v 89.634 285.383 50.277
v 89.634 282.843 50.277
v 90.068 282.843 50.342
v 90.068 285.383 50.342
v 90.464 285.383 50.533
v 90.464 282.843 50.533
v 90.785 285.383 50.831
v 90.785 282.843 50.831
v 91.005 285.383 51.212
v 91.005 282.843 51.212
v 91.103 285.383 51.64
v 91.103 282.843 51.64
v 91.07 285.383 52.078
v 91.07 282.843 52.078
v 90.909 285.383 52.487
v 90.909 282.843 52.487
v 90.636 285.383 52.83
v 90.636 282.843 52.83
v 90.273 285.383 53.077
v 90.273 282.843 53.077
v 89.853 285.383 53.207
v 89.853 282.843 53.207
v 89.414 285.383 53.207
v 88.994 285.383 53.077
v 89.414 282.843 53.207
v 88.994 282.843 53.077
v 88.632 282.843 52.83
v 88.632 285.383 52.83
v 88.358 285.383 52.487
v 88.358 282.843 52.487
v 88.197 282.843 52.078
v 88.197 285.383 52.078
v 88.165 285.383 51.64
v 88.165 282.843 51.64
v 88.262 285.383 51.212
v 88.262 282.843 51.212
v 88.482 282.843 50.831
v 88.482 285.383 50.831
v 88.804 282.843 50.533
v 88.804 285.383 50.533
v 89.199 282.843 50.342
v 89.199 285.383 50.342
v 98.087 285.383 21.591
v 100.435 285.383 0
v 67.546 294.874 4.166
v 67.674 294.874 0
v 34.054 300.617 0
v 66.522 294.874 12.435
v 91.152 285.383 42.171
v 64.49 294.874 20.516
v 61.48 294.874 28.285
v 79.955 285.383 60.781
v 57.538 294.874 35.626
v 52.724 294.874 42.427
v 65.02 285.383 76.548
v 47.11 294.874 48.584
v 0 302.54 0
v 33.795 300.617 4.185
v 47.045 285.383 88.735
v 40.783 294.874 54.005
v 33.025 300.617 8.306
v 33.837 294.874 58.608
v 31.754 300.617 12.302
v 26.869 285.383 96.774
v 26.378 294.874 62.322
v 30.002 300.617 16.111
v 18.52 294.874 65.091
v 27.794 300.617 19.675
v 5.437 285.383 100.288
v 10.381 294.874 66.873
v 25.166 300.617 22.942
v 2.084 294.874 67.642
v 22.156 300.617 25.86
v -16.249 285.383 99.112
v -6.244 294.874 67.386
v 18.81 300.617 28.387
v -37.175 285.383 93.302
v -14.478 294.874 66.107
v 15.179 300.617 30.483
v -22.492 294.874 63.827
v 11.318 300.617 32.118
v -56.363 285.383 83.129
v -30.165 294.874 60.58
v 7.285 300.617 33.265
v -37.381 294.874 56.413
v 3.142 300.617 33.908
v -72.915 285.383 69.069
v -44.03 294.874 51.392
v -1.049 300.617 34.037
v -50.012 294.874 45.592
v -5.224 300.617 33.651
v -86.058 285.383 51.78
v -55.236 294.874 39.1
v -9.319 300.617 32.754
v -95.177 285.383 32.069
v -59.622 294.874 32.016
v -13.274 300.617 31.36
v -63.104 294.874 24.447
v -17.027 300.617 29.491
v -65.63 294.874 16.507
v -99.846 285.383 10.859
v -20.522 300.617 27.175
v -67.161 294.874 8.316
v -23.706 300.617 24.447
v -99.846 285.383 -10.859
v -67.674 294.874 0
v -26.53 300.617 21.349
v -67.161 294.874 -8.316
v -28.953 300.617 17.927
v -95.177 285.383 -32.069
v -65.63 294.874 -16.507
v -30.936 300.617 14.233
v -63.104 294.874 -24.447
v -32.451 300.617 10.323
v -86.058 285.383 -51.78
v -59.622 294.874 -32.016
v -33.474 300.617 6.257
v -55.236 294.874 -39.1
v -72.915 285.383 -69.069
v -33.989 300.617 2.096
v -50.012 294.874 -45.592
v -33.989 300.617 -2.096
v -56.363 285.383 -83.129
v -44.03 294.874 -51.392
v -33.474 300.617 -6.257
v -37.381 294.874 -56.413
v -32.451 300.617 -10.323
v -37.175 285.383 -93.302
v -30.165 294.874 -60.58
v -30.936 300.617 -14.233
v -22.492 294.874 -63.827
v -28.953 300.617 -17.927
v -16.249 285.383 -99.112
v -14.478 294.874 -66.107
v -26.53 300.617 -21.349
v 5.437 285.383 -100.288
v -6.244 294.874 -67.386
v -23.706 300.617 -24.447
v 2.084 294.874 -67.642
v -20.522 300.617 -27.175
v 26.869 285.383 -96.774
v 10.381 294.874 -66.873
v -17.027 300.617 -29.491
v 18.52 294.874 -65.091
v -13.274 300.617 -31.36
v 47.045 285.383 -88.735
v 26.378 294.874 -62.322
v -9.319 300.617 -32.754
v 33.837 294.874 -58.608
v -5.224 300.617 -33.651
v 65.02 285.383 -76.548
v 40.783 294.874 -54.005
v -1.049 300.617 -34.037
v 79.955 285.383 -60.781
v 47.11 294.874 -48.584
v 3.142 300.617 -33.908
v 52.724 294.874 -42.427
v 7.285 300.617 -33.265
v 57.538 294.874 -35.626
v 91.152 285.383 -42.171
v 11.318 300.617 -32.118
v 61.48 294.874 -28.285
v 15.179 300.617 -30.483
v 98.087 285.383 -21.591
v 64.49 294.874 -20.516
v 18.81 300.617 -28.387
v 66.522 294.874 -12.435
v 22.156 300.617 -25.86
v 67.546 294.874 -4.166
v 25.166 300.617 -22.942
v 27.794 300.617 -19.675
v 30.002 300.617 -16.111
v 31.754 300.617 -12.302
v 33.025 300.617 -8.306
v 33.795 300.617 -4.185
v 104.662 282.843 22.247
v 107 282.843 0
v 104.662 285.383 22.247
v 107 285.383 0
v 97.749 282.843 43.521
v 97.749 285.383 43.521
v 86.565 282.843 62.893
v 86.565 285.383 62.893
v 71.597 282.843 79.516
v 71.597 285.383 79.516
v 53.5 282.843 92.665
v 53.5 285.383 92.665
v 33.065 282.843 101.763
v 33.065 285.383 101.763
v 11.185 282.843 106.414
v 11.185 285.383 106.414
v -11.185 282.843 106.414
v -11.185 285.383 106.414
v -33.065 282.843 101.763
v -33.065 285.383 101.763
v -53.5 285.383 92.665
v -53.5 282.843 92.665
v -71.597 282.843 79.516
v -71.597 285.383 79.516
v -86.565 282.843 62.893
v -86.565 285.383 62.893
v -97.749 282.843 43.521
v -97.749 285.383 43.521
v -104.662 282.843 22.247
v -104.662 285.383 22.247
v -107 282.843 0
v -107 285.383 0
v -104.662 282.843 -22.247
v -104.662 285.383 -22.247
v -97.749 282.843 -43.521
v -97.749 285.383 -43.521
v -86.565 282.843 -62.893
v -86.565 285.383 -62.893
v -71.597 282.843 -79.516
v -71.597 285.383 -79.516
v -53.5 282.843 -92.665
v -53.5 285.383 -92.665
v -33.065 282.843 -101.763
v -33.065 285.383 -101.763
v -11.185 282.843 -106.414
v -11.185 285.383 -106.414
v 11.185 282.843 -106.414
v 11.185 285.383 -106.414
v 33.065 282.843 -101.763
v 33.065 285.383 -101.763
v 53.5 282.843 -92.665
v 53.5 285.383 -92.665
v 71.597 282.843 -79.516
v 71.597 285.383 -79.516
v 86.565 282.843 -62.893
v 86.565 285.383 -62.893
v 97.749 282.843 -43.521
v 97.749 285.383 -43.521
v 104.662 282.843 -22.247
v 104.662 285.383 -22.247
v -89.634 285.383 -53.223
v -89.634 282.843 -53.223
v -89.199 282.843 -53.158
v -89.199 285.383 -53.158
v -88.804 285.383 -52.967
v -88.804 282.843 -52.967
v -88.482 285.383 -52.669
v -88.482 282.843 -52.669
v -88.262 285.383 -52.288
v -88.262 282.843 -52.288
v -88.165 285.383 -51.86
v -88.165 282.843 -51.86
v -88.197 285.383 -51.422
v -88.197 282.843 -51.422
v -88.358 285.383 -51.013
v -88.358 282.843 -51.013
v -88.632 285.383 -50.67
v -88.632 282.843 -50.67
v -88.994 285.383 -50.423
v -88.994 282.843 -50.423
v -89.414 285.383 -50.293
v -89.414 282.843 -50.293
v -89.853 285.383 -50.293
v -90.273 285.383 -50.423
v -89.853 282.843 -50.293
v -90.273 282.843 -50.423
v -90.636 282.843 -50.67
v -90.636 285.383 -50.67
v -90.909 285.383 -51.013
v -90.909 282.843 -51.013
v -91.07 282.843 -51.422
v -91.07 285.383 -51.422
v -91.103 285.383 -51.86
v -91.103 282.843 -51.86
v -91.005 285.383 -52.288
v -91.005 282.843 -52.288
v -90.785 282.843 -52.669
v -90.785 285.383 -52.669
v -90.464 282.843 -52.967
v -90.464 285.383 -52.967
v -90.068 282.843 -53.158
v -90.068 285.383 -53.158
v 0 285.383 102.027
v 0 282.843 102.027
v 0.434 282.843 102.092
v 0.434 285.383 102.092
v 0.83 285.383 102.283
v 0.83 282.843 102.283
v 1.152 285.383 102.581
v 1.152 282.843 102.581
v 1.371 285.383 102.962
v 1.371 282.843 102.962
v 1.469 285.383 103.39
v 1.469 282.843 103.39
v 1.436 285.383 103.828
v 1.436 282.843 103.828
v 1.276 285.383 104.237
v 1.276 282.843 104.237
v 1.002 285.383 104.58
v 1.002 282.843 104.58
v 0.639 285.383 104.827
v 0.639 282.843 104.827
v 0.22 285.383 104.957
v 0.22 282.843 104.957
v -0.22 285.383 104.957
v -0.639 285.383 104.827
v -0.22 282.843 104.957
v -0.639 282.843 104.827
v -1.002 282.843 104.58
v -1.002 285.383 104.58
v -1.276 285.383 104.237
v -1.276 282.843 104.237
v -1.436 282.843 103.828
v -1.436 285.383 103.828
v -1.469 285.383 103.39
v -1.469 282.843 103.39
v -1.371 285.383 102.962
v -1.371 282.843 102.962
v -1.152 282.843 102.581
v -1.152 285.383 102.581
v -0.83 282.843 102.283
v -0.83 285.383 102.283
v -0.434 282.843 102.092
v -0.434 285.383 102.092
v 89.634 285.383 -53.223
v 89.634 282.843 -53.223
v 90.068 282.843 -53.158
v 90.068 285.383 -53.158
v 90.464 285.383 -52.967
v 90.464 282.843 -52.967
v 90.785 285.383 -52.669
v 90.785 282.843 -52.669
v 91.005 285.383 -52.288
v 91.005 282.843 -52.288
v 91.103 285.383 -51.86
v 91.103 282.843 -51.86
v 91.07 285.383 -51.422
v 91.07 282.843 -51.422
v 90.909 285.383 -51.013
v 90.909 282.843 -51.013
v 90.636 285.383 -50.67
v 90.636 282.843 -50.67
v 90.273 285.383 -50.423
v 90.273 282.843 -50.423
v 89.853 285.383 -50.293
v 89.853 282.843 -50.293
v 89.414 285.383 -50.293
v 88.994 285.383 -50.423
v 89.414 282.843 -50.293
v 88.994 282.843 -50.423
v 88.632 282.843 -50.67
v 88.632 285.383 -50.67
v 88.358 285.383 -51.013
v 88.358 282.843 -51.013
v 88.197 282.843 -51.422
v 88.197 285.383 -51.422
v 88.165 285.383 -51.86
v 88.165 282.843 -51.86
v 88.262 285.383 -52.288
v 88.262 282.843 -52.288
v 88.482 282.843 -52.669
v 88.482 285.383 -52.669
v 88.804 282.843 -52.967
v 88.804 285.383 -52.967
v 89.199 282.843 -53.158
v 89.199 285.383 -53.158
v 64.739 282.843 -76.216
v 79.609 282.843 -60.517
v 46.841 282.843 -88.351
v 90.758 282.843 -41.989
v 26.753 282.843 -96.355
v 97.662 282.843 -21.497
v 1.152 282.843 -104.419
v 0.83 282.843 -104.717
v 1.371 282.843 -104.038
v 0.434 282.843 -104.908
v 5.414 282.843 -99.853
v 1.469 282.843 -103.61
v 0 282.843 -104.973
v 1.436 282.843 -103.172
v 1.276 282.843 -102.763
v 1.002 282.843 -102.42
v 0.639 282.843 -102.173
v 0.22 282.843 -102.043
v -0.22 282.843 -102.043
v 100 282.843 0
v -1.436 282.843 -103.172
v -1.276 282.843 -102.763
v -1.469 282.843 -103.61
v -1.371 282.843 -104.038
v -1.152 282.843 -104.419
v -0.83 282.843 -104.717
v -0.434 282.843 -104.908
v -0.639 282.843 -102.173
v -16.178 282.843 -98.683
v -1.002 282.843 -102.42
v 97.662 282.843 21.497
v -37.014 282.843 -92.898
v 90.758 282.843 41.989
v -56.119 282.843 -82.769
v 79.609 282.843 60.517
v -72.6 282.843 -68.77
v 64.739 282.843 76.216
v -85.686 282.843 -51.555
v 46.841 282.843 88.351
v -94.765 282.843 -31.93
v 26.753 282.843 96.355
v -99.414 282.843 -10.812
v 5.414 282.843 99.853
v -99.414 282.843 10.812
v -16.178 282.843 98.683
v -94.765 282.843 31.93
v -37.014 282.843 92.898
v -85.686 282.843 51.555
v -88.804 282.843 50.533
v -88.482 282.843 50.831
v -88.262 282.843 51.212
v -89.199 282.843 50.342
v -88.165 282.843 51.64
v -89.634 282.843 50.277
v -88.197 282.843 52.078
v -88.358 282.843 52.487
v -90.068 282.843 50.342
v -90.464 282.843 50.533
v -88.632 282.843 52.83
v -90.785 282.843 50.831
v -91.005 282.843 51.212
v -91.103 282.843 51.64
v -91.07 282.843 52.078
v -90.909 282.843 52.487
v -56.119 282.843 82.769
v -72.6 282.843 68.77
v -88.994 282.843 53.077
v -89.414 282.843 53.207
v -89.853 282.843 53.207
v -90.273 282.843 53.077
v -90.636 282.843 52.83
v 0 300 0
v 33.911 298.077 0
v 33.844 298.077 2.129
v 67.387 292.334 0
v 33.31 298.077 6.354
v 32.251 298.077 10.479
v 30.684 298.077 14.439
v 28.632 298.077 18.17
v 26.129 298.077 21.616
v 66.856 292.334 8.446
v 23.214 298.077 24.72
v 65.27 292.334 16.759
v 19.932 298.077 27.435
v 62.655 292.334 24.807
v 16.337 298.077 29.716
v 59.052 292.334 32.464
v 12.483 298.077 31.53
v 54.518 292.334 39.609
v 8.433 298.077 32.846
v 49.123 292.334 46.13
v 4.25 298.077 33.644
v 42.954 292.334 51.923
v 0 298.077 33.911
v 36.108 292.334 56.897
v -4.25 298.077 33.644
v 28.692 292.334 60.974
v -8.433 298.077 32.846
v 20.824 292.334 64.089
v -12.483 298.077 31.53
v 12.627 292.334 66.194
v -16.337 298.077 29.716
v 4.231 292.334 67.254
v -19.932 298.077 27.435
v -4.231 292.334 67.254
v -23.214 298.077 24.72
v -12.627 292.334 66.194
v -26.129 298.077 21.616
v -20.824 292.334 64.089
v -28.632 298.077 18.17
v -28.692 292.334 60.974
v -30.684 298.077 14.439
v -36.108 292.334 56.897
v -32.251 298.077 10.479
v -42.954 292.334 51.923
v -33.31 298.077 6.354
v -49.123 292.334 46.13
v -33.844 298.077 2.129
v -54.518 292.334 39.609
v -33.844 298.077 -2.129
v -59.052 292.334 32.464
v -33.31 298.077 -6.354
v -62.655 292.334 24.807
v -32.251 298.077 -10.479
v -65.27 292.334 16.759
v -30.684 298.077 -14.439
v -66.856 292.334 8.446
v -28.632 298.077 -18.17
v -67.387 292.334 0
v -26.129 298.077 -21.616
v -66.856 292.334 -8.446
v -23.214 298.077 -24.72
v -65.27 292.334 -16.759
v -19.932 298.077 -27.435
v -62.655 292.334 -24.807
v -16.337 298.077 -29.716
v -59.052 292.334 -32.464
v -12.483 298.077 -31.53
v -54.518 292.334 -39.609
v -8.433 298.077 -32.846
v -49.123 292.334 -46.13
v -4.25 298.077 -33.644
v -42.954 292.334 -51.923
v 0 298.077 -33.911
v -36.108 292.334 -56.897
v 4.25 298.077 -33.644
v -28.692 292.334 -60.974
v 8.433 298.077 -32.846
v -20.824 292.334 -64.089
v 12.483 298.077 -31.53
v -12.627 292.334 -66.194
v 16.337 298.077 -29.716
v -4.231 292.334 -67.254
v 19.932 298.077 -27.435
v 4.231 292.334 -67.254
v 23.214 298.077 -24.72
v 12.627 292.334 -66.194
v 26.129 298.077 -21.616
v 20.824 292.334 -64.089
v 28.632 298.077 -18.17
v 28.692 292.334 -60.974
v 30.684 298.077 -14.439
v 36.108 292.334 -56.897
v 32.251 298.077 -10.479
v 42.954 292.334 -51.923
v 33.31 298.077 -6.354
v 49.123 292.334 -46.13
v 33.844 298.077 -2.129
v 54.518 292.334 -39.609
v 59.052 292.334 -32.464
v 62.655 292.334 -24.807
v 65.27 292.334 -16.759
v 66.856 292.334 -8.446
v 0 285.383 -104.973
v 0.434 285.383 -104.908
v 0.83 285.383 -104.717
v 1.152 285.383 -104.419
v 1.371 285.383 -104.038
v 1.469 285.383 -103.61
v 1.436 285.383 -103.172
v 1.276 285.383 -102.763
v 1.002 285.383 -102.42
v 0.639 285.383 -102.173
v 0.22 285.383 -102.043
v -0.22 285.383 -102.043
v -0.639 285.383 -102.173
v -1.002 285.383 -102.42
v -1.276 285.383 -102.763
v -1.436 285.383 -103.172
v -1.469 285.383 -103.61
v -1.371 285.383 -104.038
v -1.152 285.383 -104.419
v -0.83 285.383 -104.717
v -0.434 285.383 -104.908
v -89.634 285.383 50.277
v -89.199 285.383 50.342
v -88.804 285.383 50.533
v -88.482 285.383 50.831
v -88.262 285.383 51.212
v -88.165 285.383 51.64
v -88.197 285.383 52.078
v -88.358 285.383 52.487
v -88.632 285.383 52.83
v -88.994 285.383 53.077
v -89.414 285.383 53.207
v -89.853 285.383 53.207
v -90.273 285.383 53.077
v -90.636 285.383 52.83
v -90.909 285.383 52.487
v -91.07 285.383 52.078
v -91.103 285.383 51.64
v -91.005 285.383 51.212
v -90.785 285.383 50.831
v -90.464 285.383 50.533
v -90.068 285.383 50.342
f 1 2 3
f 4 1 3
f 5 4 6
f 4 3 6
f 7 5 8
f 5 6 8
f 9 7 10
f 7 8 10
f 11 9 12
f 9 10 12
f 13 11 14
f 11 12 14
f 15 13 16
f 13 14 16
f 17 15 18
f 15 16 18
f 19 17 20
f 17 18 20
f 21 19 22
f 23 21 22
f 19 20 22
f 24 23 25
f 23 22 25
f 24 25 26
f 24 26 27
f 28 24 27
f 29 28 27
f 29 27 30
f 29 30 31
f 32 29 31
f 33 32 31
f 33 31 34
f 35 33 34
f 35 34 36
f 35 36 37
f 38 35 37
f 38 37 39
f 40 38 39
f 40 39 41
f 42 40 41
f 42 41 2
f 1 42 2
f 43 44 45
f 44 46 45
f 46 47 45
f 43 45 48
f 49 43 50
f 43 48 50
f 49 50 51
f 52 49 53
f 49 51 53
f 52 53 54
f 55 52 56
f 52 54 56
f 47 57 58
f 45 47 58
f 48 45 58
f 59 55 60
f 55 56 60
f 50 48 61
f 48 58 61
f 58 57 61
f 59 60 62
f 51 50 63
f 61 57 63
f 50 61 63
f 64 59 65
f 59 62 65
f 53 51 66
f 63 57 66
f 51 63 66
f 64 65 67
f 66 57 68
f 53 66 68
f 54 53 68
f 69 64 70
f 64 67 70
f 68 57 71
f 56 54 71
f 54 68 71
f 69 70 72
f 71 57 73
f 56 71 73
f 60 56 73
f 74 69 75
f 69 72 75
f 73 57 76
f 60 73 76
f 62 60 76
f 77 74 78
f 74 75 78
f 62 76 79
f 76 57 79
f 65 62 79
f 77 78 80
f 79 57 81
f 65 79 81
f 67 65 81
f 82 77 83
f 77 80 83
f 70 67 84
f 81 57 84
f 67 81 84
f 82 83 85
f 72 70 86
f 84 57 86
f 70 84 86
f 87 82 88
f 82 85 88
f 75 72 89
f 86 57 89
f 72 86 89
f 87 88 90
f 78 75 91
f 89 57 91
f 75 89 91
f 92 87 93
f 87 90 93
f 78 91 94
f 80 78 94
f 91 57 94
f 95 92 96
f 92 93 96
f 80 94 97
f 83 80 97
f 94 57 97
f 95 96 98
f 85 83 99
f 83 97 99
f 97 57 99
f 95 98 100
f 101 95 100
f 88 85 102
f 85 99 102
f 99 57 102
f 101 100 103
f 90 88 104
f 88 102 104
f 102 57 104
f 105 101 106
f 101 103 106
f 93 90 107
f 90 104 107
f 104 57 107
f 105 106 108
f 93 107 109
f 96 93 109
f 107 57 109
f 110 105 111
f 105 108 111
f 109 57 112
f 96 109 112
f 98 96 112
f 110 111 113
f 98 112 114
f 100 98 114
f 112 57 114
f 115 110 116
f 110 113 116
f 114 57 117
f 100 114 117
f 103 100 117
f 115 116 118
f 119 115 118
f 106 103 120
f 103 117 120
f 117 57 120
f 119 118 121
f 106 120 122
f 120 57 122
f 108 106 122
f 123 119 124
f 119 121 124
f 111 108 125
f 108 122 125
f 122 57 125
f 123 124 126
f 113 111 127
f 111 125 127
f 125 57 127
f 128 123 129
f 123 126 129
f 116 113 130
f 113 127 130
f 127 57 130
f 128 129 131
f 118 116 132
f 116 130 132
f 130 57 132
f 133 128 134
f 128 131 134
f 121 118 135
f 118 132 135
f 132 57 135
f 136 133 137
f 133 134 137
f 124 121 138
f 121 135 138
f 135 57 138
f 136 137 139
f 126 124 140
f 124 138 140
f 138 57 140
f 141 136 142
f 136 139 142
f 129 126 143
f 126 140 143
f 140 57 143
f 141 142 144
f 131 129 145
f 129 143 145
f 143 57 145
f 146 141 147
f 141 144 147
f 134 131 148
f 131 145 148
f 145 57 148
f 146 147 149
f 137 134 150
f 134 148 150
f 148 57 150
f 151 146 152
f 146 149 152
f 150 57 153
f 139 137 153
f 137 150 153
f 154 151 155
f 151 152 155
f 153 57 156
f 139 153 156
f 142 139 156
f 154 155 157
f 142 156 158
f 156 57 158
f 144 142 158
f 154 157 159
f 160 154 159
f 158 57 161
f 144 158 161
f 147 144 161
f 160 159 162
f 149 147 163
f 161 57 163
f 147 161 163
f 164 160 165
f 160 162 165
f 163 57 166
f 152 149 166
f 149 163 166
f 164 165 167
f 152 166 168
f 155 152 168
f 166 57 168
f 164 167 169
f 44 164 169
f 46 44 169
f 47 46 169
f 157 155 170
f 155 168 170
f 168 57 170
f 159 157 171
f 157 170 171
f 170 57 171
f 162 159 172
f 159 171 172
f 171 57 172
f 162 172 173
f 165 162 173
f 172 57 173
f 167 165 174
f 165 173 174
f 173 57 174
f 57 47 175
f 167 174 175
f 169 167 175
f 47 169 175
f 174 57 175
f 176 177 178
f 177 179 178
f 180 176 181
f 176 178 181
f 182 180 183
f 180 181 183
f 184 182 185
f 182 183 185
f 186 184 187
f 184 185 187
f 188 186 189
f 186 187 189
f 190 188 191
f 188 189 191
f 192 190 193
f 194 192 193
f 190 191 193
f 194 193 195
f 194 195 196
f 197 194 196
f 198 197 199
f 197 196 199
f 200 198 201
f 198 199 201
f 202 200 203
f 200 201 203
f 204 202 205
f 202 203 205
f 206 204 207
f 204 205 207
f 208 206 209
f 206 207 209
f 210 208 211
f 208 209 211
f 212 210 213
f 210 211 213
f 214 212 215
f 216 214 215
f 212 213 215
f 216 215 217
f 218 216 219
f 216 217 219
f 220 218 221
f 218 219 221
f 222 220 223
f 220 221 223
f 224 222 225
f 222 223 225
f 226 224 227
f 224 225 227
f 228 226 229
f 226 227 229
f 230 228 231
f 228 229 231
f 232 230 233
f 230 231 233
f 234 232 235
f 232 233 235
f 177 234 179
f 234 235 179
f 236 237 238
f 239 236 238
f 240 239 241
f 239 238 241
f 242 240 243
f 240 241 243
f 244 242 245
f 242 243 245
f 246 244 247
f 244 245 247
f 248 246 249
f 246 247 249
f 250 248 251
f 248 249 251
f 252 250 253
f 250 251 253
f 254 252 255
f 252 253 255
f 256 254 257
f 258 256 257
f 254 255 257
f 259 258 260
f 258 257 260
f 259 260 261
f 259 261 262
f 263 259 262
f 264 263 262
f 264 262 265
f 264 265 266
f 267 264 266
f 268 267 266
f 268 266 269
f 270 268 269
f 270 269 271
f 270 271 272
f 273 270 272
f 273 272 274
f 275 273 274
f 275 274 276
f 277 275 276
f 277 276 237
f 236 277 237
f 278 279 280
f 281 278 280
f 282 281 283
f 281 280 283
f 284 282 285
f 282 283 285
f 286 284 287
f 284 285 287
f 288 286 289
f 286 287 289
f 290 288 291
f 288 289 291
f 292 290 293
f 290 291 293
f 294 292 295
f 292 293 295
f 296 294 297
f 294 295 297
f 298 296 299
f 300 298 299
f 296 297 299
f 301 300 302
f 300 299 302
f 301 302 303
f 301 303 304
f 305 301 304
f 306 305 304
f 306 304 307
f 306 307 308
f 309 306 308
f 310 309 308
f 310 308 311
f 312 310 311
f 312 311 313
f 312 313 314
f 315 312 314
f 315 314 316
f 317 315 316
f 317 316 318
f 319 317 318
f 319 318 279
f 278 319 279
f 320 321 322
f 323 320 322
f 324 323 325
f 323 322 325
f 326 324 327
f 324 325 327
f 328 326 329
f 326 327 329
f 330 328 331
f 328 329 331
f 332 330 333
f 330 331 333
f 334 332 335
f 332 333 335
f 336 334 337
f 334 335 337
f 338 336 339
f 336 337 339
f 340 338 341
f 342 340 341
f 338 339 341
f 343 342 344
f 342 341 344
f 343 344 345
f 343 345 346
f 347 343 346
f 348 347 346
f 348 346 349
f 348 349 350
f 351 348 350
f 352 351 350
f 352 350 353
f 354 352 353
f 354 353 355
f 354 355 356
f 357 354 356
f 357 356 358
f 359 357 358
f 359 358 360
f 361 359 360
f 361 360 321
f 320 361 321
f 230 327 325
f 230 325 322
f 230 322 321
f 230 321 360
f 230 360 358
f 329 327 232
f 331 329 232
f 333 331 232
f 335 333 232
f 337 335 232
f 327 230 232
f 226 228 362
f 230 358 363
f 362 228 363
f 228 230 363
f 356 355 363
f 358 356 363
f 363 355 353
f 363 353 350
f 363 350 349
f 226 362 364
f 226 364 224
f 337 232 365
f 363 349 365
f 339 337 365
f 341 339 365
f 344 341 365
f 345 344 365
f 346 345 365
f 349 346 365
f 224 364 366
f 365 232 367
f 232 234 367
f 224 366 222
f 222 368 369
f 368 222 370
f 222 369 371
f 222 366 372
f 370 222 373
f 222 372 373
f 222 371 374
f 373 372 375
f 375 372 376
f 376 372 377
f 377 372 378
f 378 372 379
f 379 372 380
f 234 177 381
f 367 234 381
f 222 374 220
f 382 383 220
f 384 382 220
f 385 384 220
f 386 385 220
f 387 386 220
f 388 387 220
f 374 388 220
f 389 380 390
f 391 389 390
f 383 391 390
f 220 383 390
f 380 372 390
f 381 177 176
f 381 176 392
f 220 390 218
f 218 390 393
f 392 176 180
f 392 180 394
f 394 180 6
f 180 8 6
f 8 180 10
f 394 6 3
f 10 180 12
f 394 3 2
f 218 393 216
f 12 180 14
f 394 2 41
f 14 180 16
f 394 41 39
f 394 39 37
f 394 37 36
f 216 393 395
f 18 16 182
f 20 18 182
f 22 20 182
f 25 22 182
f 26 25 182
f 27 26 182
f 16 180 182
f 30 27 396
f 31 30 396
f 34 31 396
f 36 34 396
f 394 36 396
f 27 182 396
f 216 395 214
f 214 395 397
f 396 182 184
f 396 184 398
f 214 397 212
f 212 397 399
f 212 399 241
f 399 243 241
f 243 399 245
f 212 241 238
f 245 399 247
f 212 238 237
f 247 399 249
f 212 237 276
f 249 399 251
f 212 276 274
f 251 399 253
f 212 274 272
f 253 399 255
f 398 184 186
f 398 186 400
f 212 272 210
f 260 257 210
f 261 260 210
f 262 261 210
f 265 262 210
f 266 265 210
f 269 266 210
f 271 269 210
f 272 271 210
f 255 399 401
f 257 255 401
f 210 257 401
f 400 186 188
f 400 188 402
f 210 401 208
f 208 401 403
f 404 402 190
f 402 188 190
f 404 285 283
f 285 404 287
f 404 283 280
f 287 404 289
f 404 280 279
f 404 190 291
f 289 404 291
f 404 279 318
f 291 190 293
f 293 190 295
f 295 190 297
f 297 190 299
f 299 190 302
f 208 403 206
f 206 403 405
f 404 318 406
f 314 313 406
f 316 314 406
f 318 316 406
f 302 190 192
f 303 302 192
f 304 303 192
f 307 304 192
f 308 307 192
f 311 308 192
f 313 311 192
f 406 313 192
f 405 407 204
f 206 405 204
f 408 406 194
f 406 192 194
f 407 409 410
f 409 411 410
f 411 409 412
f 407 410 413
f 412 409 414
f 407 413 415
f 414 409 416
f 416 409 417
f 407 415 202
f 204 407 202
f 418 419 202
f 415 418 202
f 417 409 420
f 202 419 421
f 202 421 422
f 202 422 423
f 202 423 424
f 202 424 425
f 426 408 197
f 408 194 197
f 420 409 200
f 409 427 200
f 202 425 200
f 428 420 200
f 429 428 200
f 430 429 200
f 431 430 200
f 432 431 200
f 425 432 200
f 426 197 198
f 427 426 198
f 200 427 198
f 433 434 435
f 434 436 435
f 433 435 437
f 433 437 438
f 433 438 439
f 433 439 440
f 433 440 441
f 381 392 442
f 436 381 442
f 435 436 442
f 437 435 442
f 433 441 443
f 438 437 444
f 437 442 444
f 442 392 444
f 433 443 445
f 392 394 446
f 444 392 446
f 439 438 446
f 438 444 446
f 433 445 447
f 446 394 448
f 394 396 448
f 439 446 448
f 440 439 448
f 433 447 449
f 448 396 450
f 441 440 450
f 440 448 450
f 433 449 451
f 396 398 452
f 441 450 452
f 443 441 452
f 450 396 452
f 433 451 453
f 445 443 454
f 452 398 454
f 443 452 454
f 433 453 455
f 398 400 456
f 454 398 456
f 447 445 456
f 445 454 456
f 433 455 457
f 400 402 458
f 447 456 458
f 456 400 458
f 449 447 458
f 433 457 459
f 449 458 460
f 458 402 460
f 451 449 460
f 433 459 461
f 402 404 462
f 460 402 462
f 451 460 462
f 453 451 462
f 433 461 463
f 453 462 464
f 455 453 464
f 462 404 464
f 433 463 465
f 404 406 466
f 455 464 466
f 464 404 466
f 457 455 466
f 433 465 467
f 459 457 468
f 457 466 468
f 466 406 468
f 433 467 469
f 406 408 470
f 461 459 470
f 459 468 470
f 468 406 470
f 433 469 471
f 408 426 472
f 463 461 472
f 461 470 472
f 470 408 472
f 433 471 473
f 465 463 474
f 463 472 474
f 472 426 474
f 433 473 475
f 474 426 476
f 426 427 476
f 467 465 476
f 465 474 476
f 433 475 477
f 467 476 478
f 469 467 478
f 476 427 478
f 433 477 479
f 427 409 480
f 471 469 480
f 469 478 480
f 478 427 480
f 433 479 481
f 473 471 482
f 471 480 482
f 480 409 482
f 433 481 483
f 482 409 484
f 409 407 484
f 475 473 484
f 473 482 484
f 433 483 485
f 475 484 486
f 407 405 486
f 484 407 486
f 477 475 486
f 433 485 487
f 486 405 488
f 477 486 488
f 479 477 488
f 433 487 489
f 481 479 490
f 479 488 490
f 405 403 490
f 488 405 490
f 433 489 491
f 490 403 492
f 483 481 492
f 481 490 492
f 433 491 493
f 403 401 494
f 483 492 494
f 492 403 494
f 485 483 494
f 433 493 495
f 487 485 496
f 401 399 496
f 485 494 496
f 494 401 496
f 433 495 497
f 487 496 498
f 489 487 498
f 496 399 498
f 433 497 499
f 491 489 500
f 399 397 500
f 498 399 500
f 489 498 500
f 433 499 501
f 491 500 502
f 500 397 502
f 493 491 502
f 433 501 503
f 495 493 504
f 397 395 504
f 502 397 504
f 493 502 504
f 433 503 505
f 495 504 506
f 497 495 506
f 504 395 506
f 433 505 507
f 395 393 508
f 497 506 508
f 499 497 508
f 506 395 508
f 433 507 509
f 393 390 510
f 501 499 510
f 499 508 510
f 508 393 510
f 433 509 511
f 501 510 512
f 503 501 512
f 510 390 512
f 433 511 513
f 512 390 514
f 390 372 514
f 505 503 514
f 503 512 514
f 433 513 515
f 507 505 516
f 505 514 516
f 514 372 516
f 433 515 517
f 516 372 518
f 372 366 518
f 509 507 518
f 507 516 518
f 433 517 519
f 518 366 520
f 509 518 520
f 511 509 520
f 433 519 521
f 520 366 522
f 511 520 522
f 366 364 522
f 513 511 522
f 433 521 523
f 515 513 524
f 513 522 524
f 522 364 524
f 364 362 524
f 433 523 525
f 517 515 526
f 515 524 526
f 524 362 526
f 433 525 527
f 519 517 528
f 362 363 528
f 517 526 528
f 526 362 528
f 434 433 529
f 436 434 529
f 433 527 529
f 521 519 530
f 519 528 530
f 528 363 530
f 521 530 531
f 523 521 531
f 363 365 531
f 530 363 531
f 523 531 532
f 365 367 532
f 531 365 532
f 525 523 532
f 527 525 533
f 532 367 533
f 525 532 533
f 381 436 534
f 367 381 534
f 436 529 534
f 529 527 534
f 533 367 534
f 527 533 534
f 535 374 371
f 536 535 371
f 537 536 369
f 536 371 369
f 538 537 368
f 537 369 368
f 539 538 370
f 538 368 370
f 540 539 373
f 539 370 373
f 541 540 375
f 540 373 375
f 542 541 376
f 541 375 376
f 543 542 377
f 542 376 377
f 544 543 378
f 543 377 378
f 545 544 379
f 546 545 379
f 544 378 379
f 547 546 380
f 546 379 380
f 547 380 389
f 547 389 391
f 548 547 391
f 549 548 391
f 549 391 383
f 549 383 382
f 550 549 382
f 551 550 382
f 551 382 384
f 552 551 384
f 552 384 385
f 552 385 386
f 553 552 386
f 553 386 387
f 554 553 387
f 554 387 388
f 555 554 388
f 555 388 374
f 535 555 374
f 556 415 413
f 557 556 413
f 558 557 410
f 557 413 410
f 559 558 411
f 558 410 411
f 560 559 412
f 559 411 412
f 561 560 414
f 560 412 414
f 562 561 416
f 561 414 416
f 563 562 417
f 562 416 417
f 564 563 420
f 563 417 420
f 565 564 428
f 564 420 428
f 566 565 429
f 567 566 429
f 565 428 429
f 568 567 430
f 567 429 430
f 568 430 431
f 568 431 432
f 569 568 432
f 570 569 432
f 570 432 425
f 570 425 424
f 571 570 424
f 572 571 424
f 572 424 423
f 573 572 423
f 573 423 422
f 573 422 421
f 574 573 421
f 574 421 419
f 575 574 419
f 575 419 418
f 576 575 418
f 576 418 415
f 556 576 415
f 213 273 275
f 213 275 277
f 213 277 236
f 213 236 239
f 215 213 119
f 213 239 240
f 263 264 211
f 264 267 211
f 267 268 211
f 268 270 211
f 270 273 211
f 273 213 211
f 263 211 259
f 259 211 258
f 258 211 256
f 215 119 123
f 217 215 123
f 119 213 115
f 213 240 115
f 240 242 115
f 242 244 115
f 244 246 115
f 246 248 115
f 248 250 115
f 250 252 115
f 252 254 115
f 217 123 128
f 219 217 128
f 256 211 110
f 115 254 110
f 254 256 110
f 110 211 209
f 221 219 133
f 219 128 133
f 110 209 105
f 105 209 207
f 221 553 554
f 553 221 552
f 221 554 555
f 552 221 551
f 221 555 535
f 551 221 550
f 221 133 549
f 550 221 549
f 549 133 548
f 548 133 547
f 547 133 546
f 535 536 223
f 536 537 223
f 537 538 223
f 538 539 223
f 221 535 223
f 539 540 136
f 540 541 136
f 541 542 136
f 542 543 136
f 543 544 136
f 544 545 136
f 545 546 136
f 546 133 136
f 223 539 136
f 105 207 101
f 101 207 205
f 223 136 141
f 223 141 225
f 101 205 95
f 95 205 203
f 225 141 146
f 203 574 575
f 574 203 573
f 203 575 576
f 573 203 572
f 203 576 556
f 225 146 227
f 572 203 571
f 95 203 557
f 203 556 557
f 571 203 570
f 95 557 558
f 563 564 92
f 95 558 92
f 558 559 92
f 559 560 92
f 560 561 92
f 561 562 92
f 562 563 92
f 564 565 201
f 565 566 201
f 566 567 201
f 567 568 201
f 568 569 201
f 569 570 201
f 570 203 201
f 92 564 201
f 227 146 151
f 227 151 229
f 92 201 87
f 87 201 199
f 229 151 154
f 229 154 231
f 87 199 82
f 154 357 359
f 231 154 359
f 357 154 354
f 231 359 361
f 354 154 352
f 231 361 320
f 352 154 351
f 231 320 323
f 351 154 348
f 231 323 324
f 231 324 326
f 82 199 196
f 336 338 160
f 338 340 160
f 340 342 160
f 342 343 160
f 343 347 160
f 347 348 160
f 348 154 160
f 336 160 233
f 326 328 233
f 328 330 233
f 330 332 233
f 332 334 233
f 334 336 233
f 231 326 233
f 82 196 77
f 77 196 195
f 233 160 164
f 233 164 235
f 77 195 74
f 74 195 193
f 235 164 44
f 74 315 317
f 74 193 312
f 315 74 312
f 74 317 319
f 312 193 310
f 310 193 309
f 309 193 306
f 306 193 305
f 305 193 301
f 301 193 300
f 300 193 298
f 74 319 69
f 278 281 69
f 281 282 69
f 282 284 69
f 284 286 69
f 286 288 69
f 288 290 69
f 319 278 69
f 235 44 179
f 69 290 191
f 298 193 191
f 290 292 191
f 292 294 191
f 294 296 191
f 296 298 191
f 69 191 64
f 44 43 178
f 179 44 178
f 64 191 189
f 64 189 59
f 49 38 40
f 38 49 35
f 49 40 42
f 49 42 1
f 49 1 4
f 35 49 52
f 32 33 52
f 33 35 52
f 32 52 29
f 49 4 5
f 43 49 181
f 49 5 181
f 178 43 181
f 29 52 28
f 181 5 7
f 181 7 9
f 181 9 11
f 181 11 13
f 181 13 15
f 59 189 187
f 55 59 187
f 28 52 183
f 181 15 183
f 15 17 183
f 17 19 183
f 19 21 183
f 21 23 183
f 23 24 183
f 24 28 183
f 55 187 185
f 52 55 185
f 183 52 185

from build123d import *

# Parameters (mm, degrees)
SKETCH4_R          = 1.4732
CUT_EXTRUDE1_DEPTH = 153.597454552


with BuildPart() as part:
    # Sketch1 → Revolve1 (revolve)
    with BuildSketch(Plane.XY):
        with BuildLine():
            ThreePointArc((100.434849632, 285.382712475), (50.944900471, 298.219832868), (0, 302.54))
            Line((0, 302.54), (0, 300))
            ThreePointArc((0, 300), (50.730593618, 295.679567896), (100, 282.842712475))
            Line((100, 282.842712475), (107, 282.842712475))
            Line((107, 282.842712475), (107, 285.382712475))
            Line((107, 285.382712475), (100.434849632, 285.382712475))
        make_face()
    revolve(axis=Axis((0, 282.842712475, 0), (0, -1, 0)))

    # Sketch4 → Cut-Extrude1 (cut, through all)
    with BuildSketch(Plane.XZ.offset(-282.842712475)):
        with Locations((0, 103.5)):
            Circle(SKETCH4_R)
        with Locations((89.633629292, 51.75)):
            Circle(SKETCH4_R)
        with Locations((89.633629292, -51.75)):
            Circle(SKETCH4_R)
        with Locations((0, -103.5)):
            Circle(SKETCH4_R)
        with Locations((-89.633629292, -51.75)):
            Circle(SKETCH4_R)
        with Locations((-89.633629292, 51.75)):
            Circle(SKETCH4_R)
    extrude(amount=-CUT_EXTRUDE1_DEPTH, mode=Mode.SUBTRACT)


solid = part.part
